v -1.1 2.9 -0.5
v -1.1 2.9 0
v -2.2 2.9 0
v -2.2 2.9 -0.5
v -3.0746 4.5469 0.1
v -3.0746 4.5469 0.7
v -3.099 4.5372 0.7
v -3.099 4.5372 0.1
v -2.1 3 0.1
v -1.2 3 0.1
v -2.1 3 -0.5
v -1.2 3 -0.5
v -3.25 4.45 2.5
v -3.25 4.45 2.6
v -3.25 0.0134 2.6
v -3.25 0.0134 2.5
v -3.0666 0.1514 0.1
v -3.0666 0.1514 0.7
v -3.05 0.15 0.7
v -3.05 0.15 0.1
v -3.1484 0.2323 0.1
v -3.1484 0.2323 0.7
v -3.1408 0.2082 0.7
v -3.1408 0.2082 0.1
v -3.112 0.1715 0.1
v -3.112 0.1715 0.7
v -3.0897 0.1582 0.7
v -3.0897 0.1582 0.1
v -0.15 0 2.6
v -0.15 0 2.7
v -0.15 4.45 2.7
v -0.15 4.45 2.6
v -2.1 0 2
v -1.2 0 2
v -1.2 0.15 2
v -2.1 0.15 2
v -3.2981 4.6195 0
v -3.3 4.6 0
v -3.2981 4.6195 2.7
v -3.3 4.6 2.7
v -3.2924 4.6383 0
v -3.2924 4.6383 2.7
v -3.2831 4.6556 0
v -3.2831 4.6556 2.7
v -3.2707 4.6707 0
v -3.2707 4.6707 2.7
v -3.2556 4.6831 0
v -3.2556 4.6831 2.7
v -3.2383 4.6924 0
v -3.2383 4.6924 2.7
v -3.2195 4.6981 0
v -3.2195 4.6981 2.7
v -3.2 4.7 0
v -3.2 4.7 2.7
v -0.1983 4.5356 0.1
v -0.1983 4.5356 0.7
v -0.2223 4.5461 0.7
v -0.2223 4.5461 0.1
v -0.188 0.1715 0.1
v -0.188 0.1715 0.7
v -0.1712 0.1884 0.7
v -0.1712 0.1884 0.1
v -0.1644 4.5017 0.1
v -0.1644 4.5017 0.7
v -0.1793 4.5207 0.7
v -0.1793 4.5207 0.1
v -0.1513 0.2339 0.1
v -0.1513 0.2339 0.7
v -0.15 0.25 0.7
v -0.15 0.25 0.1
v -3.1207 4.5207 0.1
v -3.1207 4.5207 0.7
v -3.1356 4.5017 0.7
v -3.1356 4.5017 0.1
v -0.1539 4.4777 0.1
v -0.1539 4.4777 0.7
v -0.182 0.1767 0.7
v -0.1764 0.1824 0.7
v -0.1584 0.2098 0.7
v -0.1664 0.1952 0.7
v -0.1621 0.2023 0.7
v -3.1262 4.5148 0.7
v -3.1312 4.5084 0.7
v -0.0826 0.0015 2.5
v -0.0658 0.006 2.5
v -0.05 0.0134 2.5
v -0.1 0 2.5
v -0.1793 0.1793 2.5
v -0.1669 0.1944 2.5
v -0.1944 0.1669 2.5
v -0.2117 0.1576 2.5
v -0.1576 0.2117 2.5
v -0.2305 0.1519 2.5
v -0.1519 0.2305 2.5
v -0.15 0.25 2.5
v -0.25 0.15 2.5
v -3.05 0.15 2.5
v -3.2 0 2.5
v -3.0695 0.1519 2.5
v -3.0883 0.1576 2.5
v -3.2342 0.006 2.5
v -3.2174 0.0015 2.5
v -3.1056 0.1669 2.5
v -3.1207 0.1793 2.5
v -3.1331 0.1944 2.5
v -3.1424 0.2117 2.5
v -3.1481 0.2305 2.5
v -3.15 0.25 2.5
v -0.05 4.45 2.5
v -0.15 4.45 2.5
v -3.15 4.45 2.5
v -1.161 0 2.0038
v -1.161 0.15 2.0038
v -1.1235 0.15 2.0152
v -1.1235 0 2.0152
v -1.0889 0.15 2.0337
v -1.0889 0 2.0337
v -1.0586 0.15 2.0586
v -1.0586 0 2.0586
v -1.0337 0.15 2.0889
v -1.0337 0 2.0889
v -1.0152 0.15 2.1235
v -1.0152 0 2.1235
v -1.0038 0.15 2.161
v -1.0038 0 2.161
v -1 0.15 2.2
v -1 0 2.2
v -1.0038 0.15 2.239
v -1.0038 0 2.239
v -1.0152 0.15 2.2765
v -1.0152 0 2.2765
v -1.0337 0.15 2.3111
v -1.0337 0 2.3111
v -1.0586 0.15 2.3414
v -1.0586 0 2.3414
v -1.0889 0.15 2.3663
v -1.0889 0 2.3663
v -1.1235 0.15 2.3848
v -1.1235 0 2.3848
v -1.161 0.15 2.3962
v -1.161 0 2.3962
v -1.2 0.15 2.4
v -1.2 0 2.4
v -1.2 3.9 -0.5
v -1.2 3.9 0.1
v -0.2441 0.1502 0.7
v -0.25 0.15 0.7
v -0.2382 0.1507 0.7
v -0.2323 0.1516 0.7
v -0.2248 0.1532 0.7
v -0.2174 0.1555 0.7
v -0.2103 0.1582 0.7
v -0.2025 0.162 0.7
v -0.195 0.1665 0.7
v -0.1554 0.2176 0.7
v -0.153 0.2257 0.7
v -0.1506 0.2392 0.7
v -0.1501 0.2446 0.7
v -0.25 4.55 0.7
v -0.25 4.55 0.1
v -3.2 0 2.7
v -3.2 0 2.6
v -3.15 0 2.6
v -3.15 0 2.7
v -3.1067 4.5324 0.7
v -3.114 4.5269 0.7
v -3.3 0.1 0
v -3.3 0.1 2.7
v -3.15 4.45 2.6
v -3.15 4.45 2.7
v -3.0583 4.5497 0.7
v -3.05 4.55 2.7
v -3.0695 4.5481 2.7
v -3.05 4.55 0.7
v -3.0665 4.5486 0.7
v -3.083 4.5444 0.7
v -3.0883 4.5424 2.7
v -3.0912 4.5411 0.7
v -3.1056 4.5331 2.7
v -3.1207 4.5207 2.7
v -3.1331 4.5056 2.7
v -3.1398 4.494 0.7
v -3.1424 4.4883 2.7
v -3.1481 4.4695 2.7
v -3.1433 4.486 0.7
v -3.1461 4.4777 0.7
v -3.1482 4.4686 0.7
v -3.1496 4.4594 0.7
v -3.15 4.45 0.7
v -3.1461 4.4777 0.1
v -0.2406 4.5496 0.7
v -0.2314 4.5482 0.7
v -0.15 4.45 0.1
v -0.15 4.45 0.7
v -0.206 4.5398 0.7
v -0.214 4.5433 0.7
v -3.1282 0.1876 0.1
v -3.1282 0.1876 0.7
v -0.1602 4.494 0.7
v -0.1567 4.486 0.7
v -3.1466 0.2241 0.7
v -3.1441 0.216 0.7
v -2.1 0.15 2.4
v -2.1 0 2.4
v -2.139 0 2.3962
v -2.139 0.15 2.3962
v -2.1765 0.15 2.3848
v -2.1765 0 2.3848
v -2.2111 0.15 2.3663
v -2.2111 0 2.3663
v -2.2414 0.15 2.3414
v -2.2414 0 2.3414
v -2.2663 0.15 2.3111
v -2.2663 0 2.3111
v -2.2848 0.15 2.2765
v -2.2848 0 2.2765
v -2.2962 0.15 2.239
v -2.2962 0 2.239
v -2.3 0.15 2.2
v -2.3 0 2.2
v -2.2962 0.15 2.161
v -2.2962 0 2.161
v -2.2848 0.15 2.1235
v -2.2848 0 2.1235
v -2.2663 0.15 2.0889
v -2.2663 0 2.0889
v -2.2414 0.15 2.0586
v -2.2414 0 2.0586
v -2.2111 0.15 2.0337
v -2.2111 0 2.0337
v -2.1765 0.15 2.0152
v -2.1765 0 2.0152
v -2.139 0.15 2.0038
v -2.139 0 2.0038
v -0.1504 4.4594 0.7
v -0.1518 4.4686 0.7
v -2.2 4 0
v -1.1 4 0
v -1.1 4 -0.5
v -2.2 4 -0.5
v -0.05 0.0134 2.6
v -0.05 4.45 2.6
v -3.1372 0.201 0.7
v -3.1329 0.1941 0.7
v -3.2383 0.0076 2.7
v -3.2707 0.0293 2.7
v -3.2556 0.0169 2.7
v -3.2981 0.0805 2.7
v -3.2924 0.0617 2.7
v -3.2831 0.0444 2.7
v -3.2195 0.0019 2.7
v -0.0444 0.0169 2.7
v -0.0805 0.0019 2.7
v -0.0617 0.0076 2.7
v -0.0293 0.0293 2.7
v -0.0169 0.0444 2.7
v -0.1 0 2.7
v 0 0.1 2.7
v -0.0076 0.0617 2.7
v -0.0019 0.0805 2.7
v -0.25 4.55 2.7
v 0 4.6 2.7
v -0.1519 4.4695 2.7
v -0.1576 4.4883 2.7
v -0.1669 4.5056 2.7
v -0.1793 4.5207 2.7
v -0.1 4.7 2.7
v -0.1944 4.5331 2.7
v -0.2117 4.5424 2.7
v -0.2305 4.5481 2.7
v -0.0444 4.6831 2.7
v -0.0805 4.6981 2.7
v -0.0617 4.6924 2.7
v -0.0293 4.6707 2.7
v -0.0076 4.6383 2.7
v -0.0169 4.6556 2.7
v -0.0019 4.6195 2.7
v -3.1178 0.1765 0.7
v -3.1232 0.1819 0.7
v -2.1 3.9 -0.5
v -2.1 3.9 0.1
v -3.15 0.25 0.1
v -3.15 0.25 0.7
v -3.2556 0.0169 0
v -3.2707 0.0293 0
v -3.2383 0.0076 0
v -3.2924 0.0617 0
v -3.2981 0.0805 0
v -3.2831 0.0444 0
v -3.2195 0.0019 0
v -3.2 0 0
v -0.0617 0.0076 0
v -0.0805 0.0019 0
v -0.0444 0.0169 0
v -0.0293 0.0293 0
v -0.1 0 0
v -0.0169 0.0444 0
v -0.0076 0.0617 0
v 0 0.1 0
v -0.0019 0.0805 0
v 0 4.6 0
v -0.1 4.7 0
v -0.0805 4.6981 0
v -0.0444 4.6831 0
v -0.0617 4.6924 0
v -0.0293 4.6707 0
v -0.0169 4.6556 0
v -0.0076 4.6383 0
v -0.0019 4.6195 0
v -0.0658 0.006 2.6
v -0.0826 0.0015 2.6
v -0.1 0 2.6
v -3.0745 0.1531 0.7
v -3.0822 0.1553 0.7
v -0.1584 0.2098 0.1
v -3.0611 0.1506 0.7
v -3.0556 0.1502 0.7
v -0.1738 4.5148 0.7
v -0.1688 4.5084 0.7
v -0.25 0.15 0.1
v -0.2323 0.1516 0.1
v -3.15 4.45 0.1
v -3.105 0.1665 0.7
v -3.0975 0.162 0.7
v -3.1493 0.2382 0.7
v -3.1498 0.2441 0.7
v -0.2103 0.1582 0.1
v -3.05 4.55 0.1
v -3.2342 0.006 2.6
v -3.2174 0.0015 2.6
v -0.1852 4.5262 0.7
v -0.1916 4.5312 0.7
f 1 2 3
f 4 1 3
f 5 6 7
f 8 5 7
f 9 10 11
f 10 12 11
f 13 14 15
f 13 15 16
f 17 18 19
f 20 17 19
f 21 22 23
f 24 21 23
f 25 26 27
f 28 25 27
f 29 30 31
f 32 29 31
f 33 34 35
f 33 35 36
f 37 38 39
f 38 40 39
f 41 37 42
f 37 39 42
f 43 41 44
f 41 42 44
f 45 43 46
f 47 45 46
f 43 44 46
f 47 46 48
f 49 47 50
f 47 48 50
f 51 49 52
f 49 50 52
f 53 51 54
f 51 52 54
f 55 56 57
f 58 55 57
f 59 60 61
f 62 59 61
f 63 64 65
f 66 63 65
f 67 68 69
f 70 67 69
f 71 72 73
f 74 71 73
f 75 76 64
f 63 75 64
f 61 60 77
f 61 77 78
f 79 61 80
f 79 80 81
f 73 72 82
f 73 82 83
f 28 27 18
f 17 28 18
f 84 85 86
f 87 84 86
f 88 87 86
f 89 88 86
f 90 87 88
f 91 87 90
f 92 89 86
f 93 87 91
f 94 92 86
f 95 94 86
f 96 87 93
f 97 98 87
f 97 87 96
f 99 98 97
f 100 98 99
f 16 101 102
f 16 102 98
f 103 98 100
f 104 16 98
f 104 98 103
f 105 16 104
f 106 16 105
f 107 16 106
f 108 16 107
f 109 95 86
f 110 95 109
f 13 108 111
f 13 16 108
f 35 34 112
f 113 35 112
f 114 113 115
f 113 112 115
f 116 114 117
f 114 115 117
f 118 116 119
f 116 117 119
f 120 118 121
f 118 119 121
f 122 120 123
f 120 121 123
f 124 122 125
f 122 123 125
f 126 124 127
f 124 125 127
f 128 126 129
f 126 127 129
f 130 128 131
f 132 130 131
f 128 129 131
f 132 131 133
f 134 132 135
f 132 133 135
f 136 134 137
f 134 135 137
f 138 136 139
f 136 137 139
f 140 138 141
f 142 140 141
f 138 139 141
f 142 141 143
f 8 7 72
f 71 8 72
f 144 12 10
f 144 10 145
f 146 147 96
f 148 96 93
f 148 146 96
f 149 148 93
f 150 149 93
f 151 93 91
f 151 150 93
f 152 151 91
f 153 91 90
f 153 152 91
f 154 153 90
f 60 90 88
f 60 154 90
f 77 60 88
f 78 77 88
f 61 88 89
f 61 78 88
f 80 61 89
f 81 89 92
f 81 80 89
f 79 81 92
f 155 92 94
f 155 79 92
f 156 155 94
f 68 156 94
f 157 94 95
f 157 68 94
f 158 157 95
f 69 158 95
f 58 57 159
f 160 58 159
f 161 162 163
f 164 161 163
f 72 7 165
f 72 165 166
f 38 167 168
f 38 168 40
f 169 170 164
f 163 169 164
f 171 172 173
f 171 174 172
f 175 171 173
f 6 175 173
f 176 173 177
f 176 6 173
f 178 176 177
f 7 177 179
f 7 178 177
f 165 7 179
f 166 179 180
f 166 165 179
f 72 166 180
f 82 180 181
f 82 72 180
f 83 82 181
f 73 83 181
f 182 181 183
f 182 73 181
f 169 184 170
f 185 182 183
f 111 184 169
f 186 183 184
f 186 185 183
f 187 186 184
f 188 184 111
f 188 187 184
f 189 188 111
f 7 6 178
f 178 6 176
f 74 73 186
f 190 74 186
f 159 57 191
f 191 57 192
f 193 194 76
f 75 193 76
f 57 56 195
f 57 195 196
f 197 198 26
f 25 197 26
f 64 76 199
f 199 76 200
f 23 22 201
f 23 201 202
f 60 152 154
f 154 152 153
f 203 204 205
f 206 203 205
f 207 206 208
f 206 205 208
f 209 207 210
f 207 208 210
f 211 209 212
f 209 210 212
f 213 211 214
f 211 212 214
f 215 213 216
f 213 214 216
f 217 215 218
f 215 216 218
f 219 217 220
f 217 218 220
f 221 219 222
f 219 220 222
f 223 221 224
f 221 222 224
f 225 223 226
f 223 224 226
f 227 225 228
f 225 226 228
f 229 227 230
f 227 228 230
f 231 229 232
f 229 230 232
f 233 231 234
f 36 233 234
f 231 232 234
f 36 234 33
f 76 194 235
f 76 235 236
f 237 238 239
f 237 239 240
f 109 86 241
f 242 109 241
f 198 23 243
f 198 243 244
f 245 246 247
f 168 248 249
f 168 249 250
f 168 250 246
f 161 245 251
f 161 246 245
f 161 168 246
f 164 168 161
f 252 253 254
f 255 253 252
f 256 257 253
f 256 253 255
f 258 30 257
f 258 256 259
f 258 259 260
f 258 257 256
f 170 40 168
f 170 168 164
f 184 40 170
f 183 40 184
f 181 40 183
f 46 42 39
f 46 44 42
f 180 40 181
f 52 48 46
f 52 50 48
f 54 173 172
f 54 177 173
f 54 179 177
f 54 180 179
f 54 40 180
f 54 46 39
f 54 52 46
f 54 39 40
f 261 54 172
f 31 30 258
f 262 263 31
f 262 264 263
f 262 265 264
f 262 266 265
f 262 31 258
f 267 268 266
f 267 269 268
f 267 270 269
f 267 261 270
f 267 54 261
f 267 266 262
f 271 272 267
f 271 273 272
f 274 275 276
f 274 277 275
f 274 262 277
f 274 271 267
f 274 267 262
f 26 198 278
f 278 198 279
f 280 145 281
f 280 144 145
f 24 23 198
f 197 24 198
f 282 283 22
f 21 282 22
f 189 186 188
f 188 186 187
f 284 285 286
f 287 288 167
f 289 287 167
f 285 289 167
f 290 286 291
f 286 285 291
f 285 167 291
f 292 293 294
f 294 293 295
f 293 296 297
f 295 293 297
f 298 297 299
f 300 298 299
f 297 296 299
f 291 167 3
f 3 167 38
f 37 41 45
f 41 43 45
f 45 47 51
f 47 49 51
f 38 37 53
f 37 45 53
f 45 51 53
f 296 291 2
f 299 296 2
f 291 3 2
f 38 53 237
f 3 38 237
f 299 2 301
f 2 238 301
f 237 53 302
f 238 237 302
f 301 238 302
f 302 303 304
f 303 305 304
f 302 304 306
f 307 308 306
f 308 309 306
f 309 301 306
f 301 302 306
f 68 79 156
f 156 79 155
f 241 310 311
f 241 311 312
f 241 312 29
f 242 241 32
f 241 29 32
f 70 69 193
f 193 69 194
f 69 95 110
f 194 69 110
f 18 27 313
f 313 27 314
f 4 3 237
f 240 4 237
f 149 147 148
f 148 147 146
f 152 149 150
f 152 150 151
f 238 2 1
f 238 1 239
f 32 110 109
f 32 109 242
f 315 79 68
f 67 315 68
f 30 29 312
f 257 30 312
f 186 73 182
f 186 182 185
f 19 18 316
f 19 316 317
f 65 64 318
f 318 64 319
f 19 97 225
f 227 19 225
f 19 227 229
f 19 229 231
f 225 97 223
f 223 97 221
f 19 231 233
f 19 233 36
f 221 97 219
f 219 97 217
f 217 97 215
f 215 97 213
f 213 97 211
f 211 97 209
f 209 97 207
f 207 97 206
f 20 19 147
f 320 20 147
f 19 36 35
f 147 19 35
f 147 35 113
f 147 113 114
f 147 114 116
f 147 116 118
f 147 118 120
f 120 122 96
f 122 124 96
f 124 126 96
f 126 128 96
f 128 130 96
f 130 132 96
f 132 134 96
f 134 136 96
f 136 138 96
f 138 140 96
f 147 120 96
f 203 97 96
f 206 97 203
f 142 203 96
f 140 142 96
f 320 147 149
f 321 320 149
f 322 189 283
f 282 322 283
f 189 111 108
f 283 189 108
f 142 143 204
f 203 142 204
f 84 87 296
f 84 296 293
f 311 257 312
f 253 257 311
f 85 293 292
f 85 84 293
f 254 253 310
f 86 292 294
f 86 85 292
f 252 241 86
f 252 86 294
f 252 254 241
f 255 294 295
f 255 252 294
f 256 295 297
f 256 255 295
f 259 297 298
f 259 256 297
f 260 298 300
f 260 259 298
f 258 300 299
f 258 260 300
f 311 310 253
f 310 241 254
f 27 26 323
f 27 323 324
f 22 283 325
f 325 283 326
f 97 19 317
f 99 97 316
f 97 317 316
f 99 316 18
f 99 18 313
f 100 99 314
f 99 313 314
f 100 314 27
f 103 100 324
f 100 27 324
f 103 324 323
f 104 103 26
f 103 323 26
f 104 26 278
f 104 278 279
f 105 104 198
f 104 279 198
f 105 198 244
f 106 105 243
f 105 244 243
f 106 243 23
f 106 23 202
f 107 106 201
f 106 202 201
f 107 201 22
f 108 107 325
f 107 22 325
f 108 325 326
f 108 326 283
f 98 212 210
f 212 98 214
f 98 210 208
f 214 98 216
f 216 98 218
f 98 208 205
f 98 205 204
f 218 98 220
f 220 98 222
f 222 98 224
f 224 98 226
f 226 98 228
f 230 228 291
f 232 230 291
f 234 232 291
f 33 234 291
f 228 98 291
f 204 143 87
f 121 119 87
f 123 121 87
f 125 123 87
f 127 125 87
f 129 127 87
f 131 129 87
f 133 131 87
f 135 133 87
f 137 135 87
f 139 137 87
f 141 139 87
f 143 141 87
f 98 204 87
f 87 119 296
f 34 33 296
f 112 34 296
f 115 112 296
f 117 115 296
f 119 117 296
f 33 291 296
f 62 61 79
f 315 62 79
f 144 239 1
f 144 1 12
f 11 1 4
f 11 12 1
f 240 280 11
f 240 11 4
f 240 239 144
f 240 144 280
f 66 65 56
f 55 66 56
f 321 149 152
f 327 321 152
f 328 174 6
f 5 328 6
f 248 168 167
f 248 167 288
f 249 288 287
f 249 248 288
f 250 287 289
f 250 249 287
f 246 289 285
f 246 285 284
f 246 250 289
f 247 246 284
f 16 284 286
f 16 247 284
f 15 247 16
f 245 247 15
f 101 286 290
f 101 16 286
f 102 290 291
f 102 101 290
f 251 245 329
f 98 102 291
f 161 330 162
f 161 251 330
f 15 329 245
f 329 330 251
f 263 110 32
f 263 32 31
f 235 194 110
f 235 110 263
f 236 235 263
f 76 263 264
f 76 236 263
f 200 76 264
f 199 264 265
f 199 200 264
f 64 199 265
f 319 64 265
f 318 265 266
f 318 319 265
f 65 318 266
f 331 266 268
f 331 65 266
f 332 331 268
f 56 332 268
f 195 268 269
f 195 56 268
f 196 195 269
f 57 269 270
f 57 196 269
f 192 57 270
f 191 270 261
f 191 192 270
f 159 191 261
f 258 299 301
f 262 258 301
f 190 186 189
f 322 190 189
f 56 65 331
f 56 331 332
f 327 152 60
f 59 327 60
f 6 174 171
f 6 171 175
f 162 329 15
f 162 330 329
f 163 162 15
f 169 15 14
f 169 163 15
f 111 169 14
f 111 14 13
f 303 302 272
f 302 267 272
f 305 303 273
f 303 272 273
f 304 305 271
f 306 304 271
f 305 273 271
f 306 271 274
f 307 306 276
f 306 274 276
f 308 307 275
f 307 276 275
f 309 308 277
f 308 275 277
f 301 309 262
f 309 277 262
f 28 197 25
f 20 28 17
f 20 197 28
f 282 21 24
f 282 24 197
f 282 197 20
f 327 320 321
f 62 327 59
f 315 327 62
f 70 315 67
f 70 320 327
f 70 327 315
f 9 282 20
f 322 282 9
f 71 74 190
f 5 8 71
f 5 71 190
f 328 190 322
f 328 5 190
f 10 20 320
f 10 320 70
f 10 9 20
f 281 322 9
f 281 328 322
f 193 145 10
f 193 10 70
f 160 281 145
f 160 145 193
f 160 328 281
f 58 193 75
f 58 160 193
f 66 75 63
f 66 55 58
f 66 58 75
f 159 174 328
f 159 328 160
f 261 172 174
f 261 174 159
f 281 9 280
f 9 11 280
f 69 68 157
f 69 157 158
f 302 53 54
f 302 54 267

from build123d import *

# Parameters (mm, degrees)
ESQUISSE1_W              = 3.3
ESQUISSE1_H              = 4.7
BOSS_EXTRU_1_DEPTH       = 2.7
CONG_4_R                 = 0.1
CONG_5_R                 = 0.1
ESQUISSE2_W              = 3
ESQUISSE2_H              = 4.4
ENL_V_MAT_EXTRU_2_DEPTH  = 2
CONG_8_R                 = 0.1
ESQUISSE5_W              = 1.1
ESQUISSE5_H              = 1.1
ESQUISSE5_W_2            = 0.9
ESQUISSE5_H_2            = 0.9
BOSS_EXTRU_3_DEPTH       = 0.5
ESQUISSE6_W              = 0.9
ESQUISSE6_H              = 0.9
ENL_V_MAT_EXTRU_4_DEPTH  = 0.5
ENL_V_MAT_EXTRU_5_DEPTH  = 0.2
ESQUISSE8_W              = 0.1
ESQUISSE8_H              = 4.45
ENL_V_MAT_EXTRU_6_DEPTH  = 0.1
ESQUISSE10_W             = 0.1
ESQUISSE10_H             = 4.45
ENL_V_MAT_EXTRU_7_DEPTH  = 0.1
ESQUISSE11_W             = 0.9
ESQUISSE11_H             = 0.9
ENL_V_MAT_EXTRU_8_DEPTH  = 1
ESQUISSE12_R             = 0.2
ESQUISSE12_W             = 0.9
ESQUISSE12_H             = 0.4
ENL_V_MAT_EXTRU_9_DEPTH  = 1.1
ENL_V_MAT_EXTRU_11_DEPTH = 0.6


with BuildPart() as part:
    # Esquisse1 → Boss.-Extru.1 (new body)
    with BuildSketch(Plane.XY):
        with Locations((-1.65, 2.35)):
            Rectangle(ESQUISSE1_W, ESQUISSE1_H)
    extrude(amount=BOSS_EXTRU_1_DEPTH)

    # Congé4
    cong_4_edges = [part.edges().sort_by_distance(p)[0] for p in [
        (-3.3, 4.7, 1.35),
    ]]
    fillet(cong_4_edges, radius=CONG_4_R)

    # Congé5
    cong_5_edges = [part.edges().sort_by_distance(p)[0] for p in [
        (0, 0, 1.35),
        (-3.3, 0, 1.35),
        (0, 4.7, 1.35),
    ]]
    fillet(cong_5_edges, radius=CONG_5_R)

    # Esquisse2 → Enlèv. mat.-Extru.2 (cut)
    with BuildSketch(Plane.XY.offset(2.7)):
        with Locations((-1.65, 2.35)):
            Rectangle(ESQUISSE2_W, ESQUISSE2_H)
    extrude(amount=-ENL_V_MAT_EXTRU_2_DEPTH, mode=Mode.SUBTRACT)

    # Congé8
    cong_8_edges = [part.edges().sort_by_distance(p)[0] for p in [
        (-0.15, 0.15, 1.7),
        (-3.15, 0.15, 1.7),
        (-3.15, 4.55, 1.7),
        (-0.15, 4.55, 1.7),
    ]]
    fillet(cong_8_edges, radius=CONG_8_R)

    # Esquisse5 → Boss.-Extru.3 (add)
    with BuildSketch(Plane(origin=(0, 0, 0), x_dir=(-1, 0, 0), z_dir=(0, 0, -1))):
        with Locations((1.65, 3.45)):
            Rectangle(ESQUISSE5_W, ESQUISSE5_H)
        with Locations((1.65, 3.45)):
            Rectangle(ESQUISSE5_W_2, ESQUISSE5_H_2, mode=Mode.SUBTRACT)
    extrude(amount=BOSS_EXTRU_3_DEPTH)

    # Esquisse6 → Enlèv. mat.-Extru.4 (cut)
    with BuildSketch(Plane(origin=(0, 0, 0), x_dir=(-1, 0, 0), z_dir=(0, 0, -1))):
        with Locations((1.65, 3.45)):
            Rectangle(ESQUISSE6_W, ESQUISSE6_H)
    extrude(amount=-ENL_V_MAT_EXTRU_4_DEPTH, mode=Mode.SUBTRACT)

    # Esquisse7 → Enlèv. mat.-Extru.5 (cut)
    with BuildSketch(Plane.XY.offset(2.7)):
        Polygon((-3.15, 0.25), (-3.15, 0), (-0.15, 0), (-0.15, 0.25), (-0.153597253, 0.223419736), (-0.163814969, 0.199283726), (-0.179289322, 0.179289322), (-0.199283726, 0.163814969), (-0.223419736, 0.153597253), (-0.25, 0.15), (-3.05, 0.15), (-3.075882726, 0.153407637), (-3.101785208, 0.164452982), (-3.120710678, 0.179289322), (-3.136185031, 0.199283726), (-3.146402747, 0.223419736), align=None)
    extrude(amount=-ENL_V_MAT_EXTRU_5_DEPTH, mode=Mode.SUBTRACT)

    # Esquisse8 → Enlèv. mat.-Extru.6 (cut)
    with BuildSketch(Plane(origin=(-3.15, 0, 0), x_dir=(0, 0, -1), z_dir=(1, 0, 0))):
        with Locations((-2.55, 2.225)):
            Rectangle(ESQUISSE8_W, ESQUISSE8_H)
    extrude(amount=-ENL_V_MAT_EXTRU_6_DEPTH, mode=Mode.SUBTRACT)

    # Esquisse10 → Enlèv. mat.-Extru.7 (cut)
    with BuildSketch(Plane.ZY.offset(0.15)):
        with Locations((2.55, 2.225)):
            Rectangle(ESQUISSE10_W, ESQUISSE10_H)
    extrude(amount=-ENL_V_MAT_EXTRU_7_DEPTH, mode=Mode.SUBTRACT)

    # Esquisse11 → Enlèv. mat.-Extru.8 (cut)
    with BuildSketch(Plane(origin=(0, 0, 0.5), x_dir=(-1, 0, 0), z_dir=(0, 0, -1))):
        with Locations((1.65, 3.45)):
            Rectangle(ESQUISSE11_W, ESQUISSE11_H)
    extrude(amount=-ENL_V_MAT_EXTRU_8_DEPTH, mode=Mode.SUBTRACT)

    # Esquisse12 → Enlèv. mat.-Extru.9 (cut)
    with BuildSketch(Plane(origin=(0, 0, 0), x_dir=(-1, 0, 0), z_dir=(0, -1, 0))):
        with Locations((2.1, -2.2)):
            Circle(ESQUISSE12_R)
        with Locations((1.2, -2.2)):
            Circle(ESQUISSE12_R)
        with Locations((1.65, -2.2)):
            Rectangle(ESQUISSE12_W, ESQUISSE12_H)
    extrude(amount=-ENL_V_MAT_EXTRU_9_DEPTH, mode=Mode.SUBTRACT)

    # Esquisse15 → Enlèv. mat.-Extru.11 (cut)
    with BuildSketch(Plane.XY.offset(0.7)):
        Polygon((-3.05, 4.55), (-3.074637758, 4.546917392), (-3.098981719, 4.537182517), (-3.120710678, 4.520710678), (-3.135617823, 4.50166806), (-3.146075217, 4.477740811), (-3.15, 4.45), (-3.15, 0.25), (-3.148425664, 0.232325479), (-3.14084652, 0.20820395), (-3.12816425, 0.18762733), (-3.111972277, 0.17151792), (-3.089747782, 0.158238822), (-3.066631653, 0.151392758), (-3.05, 0.15), (-0.25, 0.15), (-0.232325479, 0.151574336), (-0.210252218, 0.158238822), (-0.188027723, 0.17151792), (-0.171202141, 0.188429736), (-0.158443213, 0.209783651), (-0.151309025, 0.233872648), (-0.15, 0.25), (-0.15, 4.45), (-0.153924783, 4.477740811), (-0.164382177, 4.50166806), (-0.179289322, 4.520710678), (-0.19833194, 4.535617823), (-0.222259189, 4.546075217), (-0.25, 4.55), align=None)
    extrude(amount=-ENL_V_MAT_EXTRU_11_DEPTH, mode=Mode.SUBTRACT)


solid = part.part
